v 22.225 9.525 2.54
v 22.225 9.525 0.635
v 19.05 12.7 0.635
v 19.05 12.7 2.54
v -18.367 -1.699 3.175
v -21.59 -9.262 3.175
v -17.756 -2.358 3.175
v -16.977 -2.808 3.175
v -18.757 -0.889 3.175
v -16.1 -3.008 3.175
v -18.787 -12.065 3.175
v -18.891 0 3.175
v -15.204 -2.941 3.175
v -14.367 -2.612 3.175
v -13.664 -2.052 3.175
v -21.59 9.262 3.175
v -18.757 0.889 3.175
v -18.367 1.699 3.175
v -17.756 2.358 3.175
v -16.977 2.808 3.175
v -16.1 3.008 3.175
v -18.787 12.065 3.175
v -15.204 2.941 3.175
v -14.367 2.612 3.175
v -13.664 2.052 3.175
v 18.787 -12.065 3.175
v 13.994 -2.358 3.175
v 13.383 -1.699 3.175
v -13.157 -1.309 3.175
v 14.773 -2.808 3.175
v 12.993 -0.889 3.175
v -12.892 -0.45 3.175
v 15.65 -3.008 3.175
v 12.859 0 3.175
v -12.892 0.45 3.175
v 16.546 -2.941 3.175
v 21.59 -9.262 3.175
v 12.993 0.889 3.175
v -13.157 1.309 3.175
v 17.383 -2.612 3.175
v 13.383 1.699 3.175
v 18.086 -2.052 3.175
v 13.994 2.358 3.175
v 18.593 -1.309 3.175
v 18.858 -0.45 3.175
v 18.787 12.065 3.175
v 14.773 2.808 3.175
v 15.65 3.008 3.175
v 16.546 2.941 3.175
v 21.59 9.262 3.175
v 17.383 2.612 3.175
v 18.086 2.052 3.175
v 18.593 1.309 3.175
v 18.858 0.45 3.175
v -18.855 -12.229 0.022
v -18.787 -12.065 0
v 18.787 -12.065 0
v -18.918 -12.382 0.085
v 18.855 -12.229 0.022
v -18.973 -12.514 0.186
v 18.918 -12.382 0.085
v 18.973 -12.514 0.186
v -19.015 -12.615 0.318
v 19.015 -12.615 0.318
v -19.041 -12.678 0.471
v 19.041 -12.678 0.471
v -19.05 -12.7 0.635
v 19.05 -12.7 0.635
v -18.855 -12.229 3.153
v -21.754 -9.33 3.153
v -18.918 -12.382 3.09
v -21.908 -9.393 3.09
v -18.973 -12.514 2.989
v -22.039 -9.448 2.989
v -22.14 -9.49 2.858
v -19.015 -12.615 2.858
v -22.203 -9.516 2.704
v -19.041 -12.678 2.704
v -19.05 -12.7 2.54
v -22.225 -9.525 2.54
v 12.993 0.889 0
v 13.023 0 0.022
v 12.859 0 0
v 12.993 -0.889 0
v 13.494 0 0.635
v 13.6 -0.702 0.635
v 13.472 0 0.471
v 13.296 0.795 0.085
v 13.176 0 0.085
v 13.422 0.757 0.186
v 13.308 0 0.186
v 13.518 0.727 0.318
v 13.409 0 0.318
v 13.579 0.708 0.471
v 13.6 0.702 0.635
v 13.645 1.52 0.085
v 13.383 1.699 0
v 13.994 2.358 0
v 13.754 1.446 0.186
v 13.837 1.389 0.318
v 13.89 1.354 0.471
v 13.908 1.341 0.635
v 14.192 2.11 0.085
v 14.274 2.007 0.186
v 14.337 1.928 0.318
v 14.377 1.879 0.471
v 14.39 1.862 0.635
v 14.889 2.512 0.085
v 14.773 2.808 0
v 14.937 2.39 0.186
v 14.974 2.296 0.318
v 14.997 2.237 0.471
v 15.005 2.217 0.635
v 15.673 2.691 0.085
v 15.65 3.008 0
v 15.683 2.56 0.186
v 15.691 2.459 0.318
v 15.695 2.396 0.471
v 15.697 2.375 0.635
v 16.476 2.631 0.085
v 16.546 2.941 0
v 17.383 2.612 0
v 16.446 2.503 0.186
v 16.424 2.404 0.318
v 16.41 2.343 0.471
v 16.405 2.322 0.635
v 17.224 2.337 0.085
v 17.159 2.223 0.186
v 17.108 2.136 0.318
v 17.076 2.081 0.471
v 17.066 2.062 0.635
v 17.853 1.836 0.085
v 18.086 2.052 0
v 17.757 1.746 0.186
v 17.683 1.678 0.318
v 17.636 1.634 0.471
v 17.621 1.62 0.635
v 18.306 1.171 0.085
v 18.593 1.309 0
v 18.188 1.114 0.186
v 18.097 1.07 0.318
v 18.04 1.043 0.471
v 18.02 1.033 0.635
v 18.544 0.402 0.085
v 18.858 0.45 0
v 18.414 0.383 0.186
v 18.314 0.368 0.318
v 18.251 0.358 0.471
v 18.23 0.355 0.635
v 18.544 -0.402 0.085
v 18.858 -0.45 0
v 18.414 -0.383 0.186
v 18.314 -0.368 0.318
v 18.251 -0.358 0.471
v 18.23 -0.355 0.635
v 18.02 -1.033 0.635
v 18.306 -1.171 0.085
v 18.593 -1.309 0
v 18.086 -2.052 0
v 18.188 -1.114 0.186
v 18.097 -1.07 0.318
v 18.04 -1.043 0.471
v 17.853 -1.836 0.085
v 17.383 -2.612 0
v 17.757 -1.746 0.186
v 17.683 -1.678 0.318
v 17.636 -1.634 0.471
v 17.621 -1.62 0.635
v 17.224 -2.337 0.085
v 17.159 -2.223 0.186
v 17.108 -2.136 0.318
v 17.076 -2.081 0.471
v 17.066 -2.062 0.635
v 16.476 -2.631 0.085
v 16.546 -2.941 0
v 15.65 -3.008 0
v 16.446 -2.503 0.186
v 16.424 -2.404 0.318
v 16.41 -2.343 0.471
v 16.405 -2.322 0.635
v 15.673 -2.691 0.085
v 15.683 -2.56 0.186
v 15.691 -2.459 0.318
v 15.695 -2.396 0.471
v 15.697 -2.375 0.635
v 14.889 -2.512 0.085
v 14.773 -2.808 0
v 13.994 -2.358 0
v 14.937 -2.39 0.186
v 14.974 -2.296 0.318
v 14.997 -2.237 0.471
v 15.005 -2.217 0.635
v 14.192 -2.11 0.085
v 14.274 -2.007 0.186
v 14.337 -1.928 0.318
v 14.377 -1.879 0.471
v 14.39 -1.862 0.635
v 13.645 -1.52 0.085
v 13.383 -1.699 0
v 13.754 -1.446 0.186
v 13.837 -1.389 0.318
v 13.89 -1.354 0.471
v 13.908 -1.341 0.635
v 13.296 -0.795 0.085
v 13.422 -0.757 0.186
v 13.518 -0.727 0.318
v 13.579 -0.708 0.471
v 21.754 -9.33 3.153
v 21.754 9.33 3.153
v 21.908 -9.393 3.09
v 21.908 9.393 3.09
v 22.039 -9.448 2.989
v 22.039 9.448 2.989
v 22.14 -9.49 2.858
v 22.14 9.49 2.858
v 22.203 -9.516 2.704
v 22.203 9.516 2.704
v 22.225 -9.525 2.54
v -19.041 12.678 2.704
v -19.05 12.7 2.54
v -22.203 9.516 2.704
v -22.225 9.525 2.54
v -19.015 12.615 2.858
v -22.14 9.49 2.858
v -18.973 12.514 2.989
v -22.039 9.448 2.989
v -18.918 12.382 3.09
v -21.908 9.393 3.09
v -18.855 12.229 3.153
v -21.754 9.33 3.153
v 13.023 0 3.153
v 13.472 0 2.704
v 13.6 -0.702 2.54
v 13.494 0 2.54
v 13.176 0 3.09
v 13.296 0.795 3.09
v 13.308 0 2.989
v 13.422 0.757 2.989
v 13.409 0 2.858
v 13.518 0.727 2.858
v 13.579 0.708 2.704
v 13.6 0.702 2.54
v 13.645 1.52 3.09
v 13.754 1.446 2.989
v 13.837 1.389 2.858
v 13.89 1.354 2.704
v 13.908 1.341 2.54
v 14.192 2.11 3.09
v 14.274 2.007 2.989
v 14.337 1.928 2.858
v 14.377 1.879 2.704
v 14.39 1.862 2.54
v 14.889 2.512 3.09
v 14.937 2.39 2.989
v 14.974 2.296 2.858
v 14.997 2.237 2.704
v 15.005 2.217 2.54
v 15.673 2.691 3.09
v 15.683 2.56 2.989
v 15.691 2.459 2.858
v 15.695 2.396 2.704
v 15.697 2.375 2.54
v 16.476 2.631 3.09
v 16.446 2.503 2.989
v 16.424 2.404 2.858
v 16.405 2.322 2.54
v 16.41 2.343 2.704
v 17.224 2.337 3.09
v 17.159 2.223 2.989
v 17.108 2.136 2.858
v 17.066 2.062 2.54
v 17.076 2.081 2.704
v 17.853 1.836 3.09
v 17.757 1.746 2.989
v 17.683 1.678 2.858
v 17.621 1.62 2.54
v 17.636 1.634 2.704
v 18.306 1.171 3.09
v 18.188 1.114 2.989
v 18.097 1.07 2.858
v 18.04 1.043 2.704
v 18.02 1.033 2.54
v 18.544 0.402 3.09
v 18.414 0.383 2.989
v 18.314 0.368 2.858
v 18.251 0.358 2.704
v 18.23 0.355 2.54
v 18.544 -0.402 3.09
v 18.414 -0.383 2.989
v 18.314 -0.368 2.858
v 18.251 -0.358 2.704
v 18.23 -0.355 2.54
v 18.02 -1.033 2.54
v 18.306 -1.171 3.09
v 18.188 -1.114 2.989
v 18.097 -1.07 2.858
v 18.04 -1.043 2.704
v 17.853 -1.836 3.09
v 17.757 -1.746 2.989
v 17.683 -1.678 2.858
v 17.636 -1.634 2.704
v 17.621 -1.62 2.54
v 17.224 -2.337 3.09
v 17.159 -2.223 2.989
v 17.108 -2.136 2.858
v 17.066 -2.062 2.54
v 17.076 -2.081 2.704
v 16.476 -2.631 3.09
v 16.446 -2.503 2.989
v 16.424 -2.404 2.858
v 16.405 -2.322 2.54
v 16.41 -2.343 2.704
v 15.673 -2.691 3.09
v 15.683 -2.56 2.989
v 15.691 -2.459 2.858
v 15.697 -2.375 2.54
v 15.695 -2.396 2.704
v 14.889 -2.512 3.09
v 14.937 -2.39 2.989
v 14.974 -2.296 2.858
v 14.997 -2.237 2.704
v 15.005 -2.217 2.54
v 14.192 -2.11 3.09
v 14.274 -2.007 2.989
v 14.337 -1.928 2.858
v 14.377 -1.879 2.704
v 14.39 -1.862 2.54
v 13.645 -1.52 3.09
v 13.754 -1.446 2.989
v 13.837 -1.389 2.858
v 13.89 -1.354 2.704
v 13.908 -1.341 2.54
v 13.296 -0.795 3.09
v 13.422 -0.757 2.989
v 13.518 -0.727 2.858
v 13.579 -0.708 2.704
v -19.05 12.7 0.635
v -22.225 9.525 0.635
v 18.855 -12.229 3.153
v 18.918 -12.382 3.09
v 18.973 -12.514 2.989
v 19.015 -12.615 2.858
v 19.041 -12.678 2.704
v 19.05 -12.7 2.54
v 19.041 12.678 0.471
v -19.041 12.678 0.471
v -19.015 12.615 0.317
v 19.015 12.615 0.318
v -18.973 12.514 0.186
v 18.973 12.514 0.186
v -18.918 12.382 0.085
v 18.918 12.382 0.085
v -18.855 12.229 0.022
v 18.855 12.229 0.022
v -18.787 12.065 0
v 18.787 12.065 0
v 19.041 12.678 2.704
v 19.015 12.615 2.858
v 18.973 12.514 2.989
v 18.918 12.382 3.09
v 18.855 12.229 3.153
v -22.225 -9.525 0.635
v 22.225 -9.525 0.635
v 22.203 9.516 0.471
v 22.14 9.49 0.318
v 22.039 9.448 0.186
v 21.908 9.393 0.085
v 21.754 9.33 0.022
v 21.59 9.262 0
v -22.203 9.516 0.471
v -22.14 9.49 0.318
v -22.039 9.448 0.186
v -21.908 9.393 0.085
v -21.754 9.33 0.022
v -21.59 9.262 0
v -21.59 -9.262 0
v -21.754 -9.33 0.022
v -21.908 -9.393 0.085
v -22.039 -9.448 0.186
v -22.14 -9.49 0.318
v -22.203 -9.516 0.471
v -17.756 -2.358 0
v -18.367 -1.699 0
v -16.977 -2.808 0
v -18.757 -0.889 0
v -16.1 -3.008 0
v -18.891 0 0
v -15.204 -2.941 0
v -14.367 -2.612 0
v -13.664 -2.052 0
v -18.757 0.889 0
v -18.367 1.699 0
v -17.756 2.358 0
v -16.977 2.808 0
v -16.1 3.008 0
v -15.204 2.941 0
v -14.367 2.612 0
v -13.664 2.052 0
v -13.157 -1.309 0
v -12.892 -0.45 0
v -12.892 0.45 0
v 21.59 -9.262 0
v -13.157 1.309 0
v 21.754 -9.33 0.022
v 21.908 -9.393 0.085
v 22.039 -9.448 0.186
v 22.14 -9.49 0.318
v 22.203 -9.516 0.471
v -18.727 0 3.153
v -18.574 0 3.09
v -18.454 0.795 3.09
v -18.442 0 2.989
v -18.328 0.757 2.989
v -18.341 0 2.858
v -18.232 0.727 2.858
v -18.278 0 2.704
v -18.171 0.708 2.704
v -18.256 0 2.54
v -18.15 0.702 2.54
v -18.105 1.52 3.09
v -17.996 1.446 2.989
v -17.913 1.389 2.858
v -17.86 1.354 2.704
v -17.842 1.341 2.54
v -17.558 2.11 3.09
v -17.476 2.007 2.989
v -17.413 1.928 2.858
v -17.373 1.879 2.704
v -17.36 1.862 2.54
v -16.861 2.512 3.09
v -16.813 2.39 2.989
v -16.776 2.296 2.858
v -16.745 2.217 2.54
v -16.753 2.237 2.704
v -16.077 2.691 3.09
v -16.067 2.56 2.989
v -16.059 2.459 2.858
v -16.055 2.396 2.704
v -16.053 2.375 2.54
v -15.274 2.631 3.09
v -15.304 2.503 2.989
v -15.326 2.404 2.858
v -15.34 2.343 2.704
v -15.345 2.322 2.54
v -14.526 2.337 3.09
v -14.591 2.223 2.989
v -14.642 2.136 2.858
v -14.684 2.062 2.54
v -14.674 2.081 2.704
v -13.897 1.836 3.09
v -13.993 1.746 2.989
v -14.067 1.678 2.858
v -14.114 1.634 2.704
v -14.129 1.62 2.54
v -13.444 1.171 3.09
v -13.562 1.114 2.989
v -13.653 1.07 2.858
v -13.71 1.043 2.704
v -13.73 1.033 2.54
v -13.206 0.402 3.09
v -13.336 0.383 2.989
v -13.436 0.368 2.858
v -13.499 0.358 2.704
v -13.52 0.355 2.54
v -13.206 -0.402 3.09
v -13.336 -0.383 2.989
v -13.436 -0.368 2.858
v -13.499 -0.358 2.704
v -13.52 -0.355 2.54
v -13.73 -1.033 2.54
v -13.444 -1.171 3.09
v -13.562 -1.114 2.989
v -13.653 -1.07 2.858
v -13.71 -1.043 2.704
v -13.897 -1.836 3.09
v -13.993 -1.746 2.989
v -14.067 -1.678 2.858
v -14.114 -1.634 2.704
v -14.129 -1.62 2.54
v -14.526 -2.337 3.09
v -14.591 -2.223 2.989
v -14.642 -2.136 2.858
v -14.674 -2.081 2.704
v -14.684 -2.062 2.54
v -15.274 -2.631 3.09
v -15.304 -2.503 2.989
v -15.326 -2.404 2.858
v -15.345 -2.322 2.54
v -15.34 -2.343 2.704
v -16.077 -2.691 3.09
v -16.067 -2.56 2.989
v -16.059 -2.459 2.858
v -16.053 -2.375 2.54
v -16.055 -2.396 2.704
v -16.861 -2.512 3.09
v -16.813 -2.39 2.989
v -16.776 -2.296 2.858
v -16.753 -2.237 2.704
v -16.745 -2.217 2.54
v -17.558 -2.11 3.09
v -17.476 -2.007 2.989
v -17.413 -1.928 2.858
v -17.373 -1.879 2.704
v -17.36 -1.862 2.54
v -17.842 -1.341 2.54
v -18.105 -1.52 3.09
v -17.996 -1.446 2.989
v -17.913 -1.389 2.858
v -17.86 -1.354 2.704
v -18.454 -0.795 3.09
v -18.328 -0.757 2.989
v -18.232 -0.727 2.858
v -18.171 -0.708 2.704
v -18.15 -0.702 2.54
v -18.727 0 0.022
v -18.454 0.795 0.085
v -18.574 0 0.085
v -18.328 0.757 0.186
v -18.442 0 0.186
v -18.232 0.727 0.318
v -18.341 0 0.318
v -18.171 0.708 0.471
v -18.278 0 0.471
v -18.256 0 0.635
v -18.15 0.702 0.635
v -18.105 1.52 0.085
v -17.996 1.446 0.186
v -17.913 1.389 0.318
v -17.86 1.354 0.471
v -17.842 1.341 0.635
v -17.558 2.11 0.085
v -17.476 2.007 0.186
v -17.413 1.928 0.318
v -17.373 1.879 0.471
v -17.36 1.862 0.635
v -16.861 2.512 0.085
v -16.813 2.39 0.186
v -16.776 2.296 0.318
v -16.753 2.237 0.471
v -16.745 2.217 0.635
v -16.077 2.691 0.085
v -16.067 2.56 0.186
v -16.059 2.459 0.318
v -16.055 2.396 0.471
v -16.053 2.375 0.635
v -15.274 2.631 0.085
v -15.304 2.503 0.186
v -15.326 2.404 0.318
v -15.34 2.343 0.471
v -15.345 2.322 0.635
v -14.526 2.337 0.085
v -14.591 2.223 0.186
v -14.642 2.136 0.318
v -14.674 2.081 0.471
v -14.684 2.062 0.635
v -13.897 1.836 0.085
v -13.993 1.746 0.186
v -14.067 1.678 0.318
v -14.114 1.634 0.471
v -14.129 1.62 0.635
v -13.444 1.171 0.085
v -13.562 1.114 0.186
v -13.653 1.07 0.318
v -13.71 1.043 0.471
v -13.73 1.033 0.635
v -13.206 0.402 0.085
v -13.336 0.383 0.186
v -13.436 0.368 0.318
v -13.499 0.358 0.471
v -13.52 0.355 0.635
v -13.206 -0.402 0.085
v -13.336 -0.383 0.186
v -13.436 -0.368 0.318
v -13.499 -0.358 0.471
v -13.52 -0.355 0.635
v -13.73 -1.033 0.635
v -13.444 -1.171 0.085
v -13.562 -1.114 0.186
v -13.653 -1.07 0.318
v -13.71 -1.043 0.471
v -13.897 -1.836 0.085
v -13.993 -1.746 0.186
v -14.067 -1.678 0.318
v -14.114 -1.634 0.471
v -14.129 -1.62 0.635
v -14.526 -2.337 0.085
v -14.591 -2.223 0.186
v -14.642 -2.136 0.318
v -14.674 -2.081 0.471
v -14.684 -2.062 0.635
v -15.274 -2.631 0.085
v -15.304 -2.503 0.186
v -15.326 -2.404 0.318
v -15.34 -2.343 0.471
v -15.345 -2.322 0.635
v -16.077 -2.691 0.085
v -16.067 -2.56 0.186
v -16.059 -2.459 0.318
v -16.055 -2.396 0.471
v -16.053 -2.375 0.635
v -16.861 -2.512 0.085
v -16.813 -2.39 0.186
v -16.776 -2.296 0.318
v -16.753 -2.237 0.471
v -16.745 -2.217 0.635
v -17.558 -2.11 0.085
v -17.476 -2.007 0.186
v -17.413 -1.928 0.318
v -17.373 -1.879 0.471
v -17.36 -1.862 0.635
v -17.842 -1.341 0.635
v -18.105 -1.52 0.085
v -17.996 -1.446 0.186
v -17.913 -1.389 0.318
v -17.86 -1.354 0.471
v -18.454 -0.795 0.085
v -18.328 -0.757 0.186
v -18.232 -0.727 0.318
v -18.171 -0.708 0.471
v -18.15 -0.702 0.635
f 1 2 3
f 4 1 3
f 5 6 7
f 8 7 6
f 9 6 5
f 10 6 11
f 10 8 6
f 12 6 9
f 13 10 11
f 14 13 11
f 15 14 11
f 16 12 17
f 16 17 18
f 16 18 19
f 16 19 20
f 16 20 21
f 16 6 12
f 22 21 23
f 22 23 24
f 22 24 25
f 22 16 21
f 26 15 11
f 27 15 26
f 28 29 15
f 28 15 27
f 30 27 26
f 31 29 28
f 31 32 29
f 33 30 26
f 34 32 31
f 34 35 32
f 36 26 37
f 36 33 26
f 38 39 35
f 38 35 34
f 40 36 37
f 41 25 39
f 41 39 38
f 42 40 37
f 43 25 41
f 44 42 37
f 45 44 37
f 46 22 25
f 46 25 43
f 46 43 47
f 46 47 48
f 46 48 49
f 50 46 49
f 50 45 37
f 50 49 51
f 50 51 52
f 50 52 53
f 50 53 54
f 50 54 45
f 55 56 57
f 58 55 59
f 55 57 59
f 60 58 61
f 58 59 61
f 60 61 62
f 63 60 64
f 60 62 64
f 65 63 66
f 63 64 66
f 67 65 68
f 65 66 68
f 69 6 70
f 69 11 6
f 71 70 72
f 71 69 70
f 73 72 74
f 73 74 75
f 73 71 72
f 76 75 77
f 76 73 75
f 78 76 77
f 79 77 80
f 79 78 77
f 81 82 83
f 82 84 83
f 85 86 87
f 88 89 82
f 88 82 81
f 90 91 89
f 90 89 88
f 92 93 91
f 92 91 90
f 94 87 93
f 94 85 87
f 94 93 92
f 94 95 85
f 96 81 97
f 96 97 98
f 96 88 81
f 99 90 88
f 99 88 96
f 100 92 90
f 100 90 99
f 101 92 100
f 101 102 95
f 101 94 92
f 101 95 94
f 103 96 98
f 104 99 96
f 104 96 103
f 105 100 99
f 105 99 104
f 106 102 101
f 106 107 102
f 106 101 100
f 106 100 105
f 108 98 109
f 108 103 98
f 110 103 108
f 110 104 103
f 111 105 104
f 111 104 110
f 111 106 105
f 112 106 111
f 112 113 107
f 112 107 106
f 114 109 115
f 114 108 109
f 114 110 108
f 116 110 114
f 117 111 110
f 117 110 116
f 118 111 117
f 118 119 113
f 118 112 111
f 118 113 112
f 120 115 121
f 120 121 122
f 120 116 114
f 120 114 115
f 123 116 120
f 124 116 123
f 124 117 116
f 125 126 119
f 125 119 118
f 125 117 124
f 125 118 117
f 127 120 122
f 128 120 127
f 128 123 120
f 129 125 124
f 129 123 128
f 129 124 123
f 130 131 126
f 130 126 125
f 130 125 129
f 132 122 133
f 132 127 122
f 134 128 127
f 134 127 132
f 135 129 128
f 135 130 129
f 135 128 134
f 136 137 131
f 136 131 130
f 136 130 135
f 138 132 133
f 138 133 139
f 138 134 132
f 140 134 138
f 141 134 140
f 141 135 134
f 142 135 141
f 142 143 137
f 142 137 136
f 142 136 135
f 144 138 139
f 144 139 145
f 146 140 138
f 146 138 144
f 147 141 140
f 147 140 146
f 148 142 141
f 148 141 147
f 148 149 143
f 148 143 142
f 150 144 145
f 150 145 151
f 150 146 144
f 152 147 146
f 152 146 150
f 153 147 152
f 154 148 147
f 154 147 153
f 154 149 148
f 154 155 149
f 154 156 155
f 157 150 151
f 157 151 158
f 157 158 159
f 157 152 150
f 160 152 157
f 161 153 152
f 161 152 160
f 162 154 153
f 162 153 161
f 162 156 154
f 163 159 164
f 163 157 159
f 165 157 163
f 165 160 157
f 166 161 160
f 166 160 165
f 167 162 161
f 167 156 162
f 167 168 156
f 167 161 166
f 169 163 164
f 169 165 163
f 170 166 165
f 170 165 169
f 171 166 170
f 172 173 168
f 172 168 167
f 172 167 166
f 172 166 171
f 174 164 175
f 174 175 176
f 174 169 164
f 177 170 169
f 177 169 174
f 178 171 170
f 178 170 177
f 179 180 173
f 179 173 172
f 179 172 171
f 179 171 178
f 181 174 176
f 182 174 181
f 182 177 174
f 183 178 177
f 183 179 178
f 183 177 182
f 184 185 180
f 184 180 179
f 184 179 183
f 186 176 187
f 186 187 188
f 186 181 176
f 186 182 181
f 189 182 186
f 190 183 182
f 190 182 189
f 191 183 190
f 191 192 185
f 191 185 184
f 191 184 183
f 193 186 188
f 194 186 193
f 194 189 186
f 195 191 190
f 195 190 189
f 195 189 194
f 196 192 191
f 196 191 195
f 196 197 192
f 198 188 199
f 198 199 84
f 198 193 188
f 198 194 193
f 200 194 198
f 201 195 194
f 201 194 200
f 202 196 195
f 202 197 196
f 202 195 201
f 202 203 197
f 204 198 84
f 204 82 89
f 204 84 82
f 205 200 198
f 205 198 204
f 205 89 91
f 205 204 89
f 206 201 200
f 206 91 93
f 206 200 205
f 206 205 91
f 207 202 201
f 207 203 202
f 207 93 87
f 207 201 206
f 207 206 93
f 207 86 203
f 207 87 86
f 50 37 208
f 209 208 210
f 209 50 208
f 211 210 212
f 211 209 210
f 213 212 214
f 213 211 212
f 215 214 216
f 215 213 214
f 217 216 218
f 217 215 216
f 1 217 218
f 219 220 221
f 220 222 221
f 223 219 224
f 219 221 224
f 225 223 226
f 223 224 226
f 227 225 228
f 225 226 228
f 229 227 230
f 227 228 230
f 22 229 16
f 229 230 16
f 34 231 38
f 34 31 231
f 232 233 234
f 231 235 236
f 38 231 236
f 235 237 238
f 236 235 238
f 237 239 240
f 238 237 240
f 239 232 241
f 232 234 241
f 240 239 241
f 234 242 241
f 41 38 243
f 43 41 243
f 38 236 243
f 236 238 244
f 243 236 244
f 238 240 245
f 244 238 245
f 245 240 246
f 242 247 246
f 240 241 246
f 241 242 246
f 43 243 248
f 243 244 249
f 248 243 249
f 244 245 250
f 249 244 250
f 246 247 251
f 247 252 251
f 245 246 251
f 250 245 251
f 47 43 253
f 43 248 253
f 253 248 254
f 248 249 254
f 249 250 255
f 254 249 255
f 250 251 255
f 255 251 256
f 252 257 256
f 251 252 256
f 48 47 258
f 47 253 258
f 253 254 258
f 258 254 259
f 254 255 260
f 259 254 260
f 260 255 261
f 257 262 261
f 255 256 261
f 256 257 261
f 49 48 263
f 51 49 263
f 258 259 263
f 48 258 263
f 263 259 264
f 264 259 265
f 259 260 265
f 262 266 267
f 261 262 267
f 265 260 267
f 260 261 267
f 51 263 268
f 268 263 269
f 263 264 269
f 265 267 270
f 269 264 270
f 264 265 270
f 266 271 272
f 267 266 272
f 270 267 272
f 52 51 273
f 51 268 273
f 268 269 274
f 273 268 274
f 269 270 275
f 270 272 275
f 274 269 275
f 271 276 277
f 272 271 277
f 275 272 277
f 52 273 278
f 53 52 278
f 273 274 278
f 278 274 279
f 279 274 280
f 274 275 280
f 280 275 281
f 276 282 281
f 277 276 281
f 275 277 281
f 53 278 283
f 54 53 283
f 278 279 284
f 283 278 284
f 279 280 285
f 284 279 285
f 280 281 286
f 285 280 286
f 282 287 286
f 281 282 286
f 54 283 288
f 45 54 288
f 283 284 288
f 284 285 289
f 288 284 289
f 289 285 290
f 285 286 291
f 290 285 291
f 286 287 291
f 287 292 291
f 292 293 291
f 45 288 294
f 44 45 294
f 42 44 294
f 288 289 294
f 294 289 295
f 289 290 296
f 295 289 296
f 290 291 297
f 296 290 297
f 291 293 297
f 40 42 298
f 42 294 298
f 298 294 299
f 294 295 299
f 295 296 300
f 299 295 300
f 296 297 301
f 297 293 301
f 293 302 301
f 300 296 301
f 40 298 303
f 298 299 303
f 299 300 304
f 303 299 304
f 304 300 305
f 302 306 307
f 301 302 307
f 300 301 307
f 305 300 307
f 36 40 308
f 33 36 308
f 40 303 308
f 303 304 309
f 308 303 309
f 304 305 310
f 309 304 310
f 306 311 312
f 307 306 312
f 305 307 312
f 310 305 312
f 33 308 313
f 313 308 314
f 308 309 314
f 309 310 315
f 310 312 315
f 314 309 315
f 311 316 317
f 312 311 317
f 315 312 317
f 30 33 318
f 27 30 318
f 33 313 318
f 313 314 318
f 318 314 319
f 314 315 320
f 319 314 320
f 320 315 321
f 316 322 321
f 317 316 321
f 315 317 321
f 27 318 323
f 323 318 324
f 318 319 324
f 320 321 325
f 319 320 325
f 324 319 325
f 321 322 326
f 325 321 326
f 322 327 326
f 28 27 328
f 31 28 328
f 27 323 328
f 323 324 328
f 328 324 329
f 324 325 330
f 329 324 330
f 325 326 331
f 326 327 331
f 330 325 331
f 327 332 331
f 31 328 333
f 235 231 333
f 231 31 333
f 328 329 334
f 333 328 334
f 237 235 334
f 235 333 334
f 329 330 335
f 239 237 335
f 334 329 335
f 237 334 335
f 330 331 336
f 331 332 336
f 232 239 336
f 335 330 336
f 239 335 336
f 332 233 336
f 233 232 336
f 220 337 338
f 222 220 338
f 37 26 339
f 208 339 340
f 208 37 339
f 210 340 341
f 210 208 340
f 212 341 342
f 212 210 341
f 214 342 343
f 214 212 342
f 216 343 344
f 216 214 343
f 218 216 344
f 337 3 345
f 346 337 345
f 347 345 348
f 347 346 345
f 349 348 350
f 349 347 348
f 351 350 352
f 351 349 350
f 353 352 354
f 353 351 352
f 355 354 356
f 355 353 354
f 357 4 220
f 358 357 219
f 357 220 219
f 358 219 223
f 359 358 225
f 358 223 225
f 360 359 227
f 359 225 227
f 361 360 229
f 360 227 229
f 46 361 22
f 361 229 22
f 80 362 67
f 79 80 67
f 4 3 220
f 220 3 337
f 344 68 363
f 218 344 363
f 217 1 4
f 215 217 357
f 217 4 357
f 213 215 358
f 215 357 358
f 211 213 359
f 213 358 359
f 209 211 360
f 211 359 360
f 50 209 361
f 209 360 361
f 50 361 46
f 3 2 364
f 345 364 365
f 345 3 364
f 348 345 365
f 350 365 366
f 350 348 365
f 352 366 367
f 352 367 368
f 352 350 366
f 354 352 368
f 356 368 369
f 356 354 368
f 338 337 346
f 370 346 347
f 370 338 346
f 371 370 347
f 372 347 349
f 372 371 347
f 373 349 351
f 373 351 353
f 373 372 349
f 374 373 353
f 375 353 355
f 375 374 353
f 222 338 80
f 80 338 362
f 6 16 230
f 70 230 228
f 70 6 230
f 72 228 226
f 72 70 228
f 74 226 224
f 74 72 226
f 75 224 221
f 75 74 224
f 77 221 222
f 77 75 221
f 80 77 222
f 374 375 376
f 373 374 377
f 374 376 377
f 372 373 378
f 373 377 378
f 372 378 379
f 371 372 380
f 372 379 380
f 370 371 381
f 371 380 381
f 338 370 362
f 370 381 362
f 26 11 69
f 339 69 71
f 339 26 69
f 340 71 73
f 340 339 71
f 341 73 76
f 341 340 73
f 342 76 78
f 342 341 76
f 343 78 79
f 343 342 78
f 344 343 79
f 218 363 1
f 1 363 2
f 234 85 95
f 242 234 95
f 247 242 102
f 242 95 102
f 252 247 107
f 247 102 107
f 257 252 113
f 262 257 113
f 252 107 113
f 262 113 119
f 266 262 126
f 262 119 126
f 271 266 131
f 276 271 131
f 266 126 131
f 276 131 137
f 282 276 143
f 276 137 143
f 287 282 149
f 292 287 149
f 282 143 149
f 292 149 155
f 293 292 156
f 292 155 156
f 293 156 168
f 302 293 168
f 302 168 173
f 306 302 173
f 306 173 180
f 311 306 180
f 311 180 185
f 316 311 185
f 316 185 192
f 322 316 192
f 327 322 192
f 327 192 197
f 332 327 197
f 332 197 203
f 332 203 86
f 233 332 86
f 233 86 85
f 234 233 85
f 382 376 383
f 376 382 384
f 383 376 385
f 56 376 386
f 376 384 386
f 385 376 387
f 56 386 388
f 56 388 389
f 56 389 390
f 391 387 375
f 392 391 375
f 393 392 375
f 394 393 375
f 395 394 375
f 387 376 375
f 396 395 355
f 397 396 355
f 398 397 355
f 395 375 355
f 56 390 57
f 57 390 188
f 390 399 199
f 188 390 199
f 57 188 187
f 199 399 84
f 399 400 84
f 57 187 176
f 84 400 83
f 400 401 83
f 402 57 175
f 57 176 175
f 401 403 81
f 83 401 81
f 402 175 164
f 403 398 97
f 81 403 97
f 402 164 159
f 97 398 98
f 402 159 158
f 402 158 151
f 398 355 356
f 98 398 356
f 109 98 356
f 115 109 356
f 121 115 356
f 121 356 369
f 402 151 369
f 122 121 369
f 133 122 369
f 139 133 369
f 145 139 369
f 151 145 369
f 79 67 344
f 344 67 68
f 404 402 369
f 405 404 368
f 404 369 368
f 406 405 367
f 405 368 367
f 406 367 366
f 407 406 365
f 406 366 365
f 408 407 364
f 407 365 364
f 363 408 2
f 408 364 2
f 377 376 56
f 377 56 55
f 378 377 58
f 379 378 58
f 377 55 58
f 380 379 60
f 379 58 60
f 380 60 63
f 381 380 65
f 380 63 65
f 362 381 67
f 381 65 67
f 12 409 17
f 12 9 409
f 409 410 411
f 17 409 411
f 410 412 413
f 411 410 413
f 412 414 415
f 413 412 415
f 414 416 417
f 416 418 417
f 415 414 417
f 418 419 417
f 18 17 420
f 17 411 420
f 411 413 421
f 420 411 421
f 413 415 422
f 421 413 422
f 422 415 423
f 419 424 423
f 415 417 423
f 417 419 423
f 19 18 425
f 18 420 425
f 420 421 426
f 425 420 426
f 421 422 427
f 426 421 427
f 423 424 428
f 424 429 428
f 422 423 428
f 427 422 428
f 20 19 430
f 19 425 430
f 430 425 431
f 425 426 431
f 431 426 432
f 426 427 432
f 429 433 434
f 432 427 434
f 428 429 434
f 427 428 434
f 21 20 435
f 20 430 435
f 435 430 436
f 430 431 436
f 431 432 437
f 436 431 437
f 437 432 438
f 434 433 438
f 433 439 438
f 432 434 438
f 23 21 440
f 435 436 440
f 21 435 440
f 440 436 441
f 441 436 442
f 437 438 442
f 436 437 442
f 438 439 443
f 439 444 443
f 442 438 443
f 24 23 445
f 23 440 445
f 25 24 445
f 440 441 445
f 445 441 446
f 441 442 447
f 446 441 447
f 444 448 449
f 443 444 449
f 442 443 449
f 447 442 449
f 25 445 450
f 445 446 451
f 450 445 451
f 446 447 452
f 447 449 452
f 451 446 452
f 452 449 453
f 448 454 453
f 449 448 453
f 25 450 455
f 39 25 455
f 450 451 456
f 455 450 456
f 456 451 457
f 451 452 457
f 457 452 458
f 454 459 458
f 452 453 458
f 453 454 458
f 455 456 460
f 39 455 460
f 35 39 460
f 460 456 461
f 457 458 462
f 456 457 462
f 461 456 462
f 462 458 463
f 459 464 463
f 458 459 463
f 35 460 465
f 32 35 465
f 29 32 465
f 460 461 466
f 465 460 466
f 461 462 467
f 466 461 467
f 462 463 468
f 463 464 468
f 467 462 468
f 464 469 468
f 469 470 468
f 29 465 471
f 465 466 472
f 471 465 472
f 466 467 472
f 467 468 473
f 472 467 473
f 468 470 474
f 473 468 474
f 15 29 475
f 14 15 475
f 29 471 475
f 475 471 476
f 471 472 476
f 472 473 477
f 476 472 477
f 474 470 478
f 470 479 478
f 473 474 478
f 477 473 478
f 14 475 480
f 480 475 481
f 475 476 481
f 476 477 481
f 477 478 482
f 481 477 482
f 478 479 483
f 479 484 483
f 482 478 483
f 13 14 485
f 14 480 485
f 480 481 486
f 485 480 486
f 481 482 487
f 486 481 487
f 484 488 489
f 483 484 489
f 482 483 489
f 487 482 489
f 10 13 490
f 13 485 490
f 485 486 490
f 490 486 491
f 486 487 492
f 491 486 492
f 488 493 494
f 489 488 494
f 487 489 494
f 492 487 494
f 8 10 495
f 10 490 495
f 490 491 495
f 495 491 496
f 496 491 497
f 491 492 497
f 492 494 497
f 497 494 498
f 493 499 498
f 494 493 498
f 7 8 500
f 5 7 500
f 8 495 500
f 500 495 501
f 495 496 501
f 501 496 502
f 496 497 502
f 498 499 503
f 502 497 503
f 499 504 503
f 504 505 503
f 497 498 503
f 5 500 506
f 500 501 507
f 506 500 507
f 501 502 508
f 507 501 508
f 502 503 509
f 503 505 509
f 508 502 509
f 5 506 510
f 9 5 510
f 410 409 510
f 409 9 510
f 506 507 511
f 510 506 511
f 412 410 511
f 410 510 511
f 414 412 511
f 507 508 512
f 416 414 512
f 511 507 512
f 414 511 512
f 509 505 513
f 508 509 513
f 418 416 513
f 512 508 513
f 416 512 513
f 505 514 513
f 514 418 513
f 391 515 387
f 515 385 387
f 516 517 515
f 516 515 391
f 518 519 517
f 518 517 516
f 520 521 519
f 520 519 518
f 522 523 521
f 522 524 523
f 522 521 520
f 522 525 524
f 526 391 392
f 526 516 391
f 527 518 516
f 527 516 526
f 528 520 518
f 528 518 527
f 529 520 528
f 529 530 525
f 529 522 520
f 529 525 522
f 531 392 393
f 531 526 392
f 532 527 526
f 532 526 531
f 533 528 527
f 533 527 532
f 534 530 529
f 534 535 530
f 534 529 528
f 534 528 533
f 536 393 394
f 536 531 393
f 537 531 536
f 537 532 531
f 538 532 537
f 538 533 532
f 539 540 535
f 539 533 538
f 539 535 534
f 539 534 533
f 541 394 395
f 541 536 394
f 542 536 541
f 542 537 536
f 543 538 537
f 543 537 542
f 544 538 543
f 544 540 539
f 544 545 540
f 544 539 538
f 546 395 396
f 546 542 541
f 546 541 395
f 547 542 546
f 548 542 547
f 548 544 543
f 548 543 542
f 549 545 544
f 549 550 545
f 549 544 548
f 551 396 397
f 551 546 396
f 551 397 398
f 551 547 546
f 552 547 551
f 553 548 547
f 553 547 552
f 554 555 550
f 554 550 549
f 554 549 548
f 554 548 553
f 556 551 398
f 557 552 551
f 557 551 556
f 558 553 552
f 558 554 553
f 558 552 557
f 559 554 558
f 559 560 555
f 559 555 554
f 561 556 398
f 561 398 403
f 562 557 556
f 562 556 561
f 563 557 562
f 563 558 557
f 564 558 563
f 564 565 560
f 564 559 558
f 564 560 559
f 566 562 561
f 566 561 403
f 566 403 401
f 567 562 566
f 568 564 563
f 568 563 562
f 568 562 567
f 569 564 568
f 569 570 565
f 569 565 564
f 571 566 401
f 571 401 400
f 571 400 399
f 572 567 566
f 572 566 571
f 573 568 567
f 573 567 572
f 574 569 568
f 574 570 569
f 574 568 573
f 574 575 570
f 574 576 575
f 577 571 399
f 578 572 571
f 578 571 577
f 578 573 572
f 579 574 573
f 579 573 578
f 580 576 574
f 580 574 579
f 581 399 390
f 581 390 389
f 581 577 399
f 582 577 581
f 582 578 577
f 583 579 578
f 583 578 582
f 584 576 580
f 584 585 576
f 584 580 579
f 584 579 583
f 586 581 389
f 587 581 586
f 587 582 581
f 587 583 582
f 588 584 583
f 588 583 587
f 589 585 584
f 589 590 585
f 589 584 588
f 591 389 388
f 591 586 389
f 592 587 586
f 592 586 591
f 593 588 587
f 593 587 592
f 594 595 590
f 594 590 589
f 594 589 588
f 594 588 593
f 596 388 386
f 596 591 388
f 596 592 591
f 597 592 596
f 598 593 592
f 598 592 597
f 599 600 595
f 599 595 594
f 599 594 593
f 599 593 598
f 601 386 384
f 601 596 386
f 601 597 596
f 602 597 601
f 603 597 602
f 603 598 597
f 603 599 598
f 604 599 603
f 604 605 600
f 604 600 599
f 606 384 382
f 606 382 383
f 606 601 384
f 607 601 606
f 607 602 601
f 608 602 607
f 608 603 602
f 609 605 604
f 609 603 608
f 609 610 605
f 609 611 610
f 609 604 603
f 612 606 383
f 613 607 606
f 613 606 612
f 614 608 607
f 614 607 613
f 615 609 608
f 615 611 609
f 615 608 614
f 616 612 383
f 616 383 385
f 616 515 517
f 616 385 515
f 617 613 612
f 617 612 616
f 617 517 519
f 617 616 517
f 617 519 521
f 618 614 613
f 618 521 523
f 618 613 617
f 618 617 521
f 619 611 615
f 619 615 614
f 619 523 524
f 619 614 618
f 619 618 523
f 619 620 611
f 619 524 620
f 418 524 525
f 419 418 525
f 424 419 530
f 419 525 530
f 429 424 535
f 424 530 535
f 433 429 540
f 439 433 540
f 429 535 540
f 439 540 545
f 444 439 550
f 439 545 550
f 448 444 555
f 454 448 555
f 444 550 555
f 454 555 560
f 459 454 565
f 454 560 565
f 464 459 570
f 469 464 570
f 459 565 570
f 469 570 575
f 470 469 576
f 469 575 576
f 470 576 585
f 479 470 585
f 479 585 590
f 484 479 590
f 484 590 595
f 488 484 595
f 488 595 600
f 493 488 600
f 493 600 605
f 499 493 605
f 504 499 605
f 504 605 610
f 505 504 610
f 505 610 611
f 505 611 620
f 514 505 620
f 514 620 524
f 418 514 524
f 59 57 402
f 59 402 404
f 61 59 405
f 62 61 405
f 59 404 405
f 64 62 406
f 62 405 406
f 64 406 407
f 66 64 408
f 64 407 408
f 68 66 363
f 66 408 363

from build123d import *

# Parameters (mm, degrees)
BOSS_EXTRUDE1_DEPTH            = 3.175
F_3_16_0_1875_DIAMETER_HOLE1_D = 4.7625
FILLET1_R                      = 0.635


with BuildPart() as part:
    # Sketch1 → Boss-Extrude1 (new body)
    with BuildSketch(Plane.XY):
        Polygon((19.05, 12.7), (-19.05, 12.7), (-22.225, 9.525), (-22.225, -9.525), (-19.05, -12.7), (19.05, -12.7), (22.225, -9.525), (22.225, 9.525), align=None)
    extrude(amount=BOSS_EXTRUDE1_DEPTH)

    # 3/16 (0.1875) Diameter Hole1 (through all)
    with Locations(Plane.XY.offset(3.175)):
        with Locations((15.875, 0), (-15.875, 0)):
            Hole(F_3_16_0_1875_DIAMETER_HOLE1_D / 2)

    # Fillet1
    fillet1_edges = [part.edges().sort_by_distance(p)[0] for p in [
        (-20.6375, 11.1125, 3.175),
        (0, 12.7, 0),
        (20.6375, 11.1125, 0),
        (-22.225, 0, 3.175),
        (-20.6375, -11.1125, 3.175),
        (0, -12.7, 3.175),
        (20.6375, -11.1125, 3.175),
        (22.225, 0, 3.175),
        (-13.49375, 0, 3.175),
        (-13.49375, 0, 0),
        (18.25625, 0, 3.175),
        (18.25625, 0, 0),
        (20.6375, 11.1125, 3.175),
        (0, 12.7, 3.175),
        (22.225, 0, 0),
        (20.6375, -11.1125, 0),
        (0, -12.7, 0),
        (-20.6375, -11.1125, 0),
        (-22.225, 0, 0),
        (-20.6375, 11.1125, 0),
    ]]
    fillet(fillet1_edges, radius=FILLET1_R)


solid = part.part
